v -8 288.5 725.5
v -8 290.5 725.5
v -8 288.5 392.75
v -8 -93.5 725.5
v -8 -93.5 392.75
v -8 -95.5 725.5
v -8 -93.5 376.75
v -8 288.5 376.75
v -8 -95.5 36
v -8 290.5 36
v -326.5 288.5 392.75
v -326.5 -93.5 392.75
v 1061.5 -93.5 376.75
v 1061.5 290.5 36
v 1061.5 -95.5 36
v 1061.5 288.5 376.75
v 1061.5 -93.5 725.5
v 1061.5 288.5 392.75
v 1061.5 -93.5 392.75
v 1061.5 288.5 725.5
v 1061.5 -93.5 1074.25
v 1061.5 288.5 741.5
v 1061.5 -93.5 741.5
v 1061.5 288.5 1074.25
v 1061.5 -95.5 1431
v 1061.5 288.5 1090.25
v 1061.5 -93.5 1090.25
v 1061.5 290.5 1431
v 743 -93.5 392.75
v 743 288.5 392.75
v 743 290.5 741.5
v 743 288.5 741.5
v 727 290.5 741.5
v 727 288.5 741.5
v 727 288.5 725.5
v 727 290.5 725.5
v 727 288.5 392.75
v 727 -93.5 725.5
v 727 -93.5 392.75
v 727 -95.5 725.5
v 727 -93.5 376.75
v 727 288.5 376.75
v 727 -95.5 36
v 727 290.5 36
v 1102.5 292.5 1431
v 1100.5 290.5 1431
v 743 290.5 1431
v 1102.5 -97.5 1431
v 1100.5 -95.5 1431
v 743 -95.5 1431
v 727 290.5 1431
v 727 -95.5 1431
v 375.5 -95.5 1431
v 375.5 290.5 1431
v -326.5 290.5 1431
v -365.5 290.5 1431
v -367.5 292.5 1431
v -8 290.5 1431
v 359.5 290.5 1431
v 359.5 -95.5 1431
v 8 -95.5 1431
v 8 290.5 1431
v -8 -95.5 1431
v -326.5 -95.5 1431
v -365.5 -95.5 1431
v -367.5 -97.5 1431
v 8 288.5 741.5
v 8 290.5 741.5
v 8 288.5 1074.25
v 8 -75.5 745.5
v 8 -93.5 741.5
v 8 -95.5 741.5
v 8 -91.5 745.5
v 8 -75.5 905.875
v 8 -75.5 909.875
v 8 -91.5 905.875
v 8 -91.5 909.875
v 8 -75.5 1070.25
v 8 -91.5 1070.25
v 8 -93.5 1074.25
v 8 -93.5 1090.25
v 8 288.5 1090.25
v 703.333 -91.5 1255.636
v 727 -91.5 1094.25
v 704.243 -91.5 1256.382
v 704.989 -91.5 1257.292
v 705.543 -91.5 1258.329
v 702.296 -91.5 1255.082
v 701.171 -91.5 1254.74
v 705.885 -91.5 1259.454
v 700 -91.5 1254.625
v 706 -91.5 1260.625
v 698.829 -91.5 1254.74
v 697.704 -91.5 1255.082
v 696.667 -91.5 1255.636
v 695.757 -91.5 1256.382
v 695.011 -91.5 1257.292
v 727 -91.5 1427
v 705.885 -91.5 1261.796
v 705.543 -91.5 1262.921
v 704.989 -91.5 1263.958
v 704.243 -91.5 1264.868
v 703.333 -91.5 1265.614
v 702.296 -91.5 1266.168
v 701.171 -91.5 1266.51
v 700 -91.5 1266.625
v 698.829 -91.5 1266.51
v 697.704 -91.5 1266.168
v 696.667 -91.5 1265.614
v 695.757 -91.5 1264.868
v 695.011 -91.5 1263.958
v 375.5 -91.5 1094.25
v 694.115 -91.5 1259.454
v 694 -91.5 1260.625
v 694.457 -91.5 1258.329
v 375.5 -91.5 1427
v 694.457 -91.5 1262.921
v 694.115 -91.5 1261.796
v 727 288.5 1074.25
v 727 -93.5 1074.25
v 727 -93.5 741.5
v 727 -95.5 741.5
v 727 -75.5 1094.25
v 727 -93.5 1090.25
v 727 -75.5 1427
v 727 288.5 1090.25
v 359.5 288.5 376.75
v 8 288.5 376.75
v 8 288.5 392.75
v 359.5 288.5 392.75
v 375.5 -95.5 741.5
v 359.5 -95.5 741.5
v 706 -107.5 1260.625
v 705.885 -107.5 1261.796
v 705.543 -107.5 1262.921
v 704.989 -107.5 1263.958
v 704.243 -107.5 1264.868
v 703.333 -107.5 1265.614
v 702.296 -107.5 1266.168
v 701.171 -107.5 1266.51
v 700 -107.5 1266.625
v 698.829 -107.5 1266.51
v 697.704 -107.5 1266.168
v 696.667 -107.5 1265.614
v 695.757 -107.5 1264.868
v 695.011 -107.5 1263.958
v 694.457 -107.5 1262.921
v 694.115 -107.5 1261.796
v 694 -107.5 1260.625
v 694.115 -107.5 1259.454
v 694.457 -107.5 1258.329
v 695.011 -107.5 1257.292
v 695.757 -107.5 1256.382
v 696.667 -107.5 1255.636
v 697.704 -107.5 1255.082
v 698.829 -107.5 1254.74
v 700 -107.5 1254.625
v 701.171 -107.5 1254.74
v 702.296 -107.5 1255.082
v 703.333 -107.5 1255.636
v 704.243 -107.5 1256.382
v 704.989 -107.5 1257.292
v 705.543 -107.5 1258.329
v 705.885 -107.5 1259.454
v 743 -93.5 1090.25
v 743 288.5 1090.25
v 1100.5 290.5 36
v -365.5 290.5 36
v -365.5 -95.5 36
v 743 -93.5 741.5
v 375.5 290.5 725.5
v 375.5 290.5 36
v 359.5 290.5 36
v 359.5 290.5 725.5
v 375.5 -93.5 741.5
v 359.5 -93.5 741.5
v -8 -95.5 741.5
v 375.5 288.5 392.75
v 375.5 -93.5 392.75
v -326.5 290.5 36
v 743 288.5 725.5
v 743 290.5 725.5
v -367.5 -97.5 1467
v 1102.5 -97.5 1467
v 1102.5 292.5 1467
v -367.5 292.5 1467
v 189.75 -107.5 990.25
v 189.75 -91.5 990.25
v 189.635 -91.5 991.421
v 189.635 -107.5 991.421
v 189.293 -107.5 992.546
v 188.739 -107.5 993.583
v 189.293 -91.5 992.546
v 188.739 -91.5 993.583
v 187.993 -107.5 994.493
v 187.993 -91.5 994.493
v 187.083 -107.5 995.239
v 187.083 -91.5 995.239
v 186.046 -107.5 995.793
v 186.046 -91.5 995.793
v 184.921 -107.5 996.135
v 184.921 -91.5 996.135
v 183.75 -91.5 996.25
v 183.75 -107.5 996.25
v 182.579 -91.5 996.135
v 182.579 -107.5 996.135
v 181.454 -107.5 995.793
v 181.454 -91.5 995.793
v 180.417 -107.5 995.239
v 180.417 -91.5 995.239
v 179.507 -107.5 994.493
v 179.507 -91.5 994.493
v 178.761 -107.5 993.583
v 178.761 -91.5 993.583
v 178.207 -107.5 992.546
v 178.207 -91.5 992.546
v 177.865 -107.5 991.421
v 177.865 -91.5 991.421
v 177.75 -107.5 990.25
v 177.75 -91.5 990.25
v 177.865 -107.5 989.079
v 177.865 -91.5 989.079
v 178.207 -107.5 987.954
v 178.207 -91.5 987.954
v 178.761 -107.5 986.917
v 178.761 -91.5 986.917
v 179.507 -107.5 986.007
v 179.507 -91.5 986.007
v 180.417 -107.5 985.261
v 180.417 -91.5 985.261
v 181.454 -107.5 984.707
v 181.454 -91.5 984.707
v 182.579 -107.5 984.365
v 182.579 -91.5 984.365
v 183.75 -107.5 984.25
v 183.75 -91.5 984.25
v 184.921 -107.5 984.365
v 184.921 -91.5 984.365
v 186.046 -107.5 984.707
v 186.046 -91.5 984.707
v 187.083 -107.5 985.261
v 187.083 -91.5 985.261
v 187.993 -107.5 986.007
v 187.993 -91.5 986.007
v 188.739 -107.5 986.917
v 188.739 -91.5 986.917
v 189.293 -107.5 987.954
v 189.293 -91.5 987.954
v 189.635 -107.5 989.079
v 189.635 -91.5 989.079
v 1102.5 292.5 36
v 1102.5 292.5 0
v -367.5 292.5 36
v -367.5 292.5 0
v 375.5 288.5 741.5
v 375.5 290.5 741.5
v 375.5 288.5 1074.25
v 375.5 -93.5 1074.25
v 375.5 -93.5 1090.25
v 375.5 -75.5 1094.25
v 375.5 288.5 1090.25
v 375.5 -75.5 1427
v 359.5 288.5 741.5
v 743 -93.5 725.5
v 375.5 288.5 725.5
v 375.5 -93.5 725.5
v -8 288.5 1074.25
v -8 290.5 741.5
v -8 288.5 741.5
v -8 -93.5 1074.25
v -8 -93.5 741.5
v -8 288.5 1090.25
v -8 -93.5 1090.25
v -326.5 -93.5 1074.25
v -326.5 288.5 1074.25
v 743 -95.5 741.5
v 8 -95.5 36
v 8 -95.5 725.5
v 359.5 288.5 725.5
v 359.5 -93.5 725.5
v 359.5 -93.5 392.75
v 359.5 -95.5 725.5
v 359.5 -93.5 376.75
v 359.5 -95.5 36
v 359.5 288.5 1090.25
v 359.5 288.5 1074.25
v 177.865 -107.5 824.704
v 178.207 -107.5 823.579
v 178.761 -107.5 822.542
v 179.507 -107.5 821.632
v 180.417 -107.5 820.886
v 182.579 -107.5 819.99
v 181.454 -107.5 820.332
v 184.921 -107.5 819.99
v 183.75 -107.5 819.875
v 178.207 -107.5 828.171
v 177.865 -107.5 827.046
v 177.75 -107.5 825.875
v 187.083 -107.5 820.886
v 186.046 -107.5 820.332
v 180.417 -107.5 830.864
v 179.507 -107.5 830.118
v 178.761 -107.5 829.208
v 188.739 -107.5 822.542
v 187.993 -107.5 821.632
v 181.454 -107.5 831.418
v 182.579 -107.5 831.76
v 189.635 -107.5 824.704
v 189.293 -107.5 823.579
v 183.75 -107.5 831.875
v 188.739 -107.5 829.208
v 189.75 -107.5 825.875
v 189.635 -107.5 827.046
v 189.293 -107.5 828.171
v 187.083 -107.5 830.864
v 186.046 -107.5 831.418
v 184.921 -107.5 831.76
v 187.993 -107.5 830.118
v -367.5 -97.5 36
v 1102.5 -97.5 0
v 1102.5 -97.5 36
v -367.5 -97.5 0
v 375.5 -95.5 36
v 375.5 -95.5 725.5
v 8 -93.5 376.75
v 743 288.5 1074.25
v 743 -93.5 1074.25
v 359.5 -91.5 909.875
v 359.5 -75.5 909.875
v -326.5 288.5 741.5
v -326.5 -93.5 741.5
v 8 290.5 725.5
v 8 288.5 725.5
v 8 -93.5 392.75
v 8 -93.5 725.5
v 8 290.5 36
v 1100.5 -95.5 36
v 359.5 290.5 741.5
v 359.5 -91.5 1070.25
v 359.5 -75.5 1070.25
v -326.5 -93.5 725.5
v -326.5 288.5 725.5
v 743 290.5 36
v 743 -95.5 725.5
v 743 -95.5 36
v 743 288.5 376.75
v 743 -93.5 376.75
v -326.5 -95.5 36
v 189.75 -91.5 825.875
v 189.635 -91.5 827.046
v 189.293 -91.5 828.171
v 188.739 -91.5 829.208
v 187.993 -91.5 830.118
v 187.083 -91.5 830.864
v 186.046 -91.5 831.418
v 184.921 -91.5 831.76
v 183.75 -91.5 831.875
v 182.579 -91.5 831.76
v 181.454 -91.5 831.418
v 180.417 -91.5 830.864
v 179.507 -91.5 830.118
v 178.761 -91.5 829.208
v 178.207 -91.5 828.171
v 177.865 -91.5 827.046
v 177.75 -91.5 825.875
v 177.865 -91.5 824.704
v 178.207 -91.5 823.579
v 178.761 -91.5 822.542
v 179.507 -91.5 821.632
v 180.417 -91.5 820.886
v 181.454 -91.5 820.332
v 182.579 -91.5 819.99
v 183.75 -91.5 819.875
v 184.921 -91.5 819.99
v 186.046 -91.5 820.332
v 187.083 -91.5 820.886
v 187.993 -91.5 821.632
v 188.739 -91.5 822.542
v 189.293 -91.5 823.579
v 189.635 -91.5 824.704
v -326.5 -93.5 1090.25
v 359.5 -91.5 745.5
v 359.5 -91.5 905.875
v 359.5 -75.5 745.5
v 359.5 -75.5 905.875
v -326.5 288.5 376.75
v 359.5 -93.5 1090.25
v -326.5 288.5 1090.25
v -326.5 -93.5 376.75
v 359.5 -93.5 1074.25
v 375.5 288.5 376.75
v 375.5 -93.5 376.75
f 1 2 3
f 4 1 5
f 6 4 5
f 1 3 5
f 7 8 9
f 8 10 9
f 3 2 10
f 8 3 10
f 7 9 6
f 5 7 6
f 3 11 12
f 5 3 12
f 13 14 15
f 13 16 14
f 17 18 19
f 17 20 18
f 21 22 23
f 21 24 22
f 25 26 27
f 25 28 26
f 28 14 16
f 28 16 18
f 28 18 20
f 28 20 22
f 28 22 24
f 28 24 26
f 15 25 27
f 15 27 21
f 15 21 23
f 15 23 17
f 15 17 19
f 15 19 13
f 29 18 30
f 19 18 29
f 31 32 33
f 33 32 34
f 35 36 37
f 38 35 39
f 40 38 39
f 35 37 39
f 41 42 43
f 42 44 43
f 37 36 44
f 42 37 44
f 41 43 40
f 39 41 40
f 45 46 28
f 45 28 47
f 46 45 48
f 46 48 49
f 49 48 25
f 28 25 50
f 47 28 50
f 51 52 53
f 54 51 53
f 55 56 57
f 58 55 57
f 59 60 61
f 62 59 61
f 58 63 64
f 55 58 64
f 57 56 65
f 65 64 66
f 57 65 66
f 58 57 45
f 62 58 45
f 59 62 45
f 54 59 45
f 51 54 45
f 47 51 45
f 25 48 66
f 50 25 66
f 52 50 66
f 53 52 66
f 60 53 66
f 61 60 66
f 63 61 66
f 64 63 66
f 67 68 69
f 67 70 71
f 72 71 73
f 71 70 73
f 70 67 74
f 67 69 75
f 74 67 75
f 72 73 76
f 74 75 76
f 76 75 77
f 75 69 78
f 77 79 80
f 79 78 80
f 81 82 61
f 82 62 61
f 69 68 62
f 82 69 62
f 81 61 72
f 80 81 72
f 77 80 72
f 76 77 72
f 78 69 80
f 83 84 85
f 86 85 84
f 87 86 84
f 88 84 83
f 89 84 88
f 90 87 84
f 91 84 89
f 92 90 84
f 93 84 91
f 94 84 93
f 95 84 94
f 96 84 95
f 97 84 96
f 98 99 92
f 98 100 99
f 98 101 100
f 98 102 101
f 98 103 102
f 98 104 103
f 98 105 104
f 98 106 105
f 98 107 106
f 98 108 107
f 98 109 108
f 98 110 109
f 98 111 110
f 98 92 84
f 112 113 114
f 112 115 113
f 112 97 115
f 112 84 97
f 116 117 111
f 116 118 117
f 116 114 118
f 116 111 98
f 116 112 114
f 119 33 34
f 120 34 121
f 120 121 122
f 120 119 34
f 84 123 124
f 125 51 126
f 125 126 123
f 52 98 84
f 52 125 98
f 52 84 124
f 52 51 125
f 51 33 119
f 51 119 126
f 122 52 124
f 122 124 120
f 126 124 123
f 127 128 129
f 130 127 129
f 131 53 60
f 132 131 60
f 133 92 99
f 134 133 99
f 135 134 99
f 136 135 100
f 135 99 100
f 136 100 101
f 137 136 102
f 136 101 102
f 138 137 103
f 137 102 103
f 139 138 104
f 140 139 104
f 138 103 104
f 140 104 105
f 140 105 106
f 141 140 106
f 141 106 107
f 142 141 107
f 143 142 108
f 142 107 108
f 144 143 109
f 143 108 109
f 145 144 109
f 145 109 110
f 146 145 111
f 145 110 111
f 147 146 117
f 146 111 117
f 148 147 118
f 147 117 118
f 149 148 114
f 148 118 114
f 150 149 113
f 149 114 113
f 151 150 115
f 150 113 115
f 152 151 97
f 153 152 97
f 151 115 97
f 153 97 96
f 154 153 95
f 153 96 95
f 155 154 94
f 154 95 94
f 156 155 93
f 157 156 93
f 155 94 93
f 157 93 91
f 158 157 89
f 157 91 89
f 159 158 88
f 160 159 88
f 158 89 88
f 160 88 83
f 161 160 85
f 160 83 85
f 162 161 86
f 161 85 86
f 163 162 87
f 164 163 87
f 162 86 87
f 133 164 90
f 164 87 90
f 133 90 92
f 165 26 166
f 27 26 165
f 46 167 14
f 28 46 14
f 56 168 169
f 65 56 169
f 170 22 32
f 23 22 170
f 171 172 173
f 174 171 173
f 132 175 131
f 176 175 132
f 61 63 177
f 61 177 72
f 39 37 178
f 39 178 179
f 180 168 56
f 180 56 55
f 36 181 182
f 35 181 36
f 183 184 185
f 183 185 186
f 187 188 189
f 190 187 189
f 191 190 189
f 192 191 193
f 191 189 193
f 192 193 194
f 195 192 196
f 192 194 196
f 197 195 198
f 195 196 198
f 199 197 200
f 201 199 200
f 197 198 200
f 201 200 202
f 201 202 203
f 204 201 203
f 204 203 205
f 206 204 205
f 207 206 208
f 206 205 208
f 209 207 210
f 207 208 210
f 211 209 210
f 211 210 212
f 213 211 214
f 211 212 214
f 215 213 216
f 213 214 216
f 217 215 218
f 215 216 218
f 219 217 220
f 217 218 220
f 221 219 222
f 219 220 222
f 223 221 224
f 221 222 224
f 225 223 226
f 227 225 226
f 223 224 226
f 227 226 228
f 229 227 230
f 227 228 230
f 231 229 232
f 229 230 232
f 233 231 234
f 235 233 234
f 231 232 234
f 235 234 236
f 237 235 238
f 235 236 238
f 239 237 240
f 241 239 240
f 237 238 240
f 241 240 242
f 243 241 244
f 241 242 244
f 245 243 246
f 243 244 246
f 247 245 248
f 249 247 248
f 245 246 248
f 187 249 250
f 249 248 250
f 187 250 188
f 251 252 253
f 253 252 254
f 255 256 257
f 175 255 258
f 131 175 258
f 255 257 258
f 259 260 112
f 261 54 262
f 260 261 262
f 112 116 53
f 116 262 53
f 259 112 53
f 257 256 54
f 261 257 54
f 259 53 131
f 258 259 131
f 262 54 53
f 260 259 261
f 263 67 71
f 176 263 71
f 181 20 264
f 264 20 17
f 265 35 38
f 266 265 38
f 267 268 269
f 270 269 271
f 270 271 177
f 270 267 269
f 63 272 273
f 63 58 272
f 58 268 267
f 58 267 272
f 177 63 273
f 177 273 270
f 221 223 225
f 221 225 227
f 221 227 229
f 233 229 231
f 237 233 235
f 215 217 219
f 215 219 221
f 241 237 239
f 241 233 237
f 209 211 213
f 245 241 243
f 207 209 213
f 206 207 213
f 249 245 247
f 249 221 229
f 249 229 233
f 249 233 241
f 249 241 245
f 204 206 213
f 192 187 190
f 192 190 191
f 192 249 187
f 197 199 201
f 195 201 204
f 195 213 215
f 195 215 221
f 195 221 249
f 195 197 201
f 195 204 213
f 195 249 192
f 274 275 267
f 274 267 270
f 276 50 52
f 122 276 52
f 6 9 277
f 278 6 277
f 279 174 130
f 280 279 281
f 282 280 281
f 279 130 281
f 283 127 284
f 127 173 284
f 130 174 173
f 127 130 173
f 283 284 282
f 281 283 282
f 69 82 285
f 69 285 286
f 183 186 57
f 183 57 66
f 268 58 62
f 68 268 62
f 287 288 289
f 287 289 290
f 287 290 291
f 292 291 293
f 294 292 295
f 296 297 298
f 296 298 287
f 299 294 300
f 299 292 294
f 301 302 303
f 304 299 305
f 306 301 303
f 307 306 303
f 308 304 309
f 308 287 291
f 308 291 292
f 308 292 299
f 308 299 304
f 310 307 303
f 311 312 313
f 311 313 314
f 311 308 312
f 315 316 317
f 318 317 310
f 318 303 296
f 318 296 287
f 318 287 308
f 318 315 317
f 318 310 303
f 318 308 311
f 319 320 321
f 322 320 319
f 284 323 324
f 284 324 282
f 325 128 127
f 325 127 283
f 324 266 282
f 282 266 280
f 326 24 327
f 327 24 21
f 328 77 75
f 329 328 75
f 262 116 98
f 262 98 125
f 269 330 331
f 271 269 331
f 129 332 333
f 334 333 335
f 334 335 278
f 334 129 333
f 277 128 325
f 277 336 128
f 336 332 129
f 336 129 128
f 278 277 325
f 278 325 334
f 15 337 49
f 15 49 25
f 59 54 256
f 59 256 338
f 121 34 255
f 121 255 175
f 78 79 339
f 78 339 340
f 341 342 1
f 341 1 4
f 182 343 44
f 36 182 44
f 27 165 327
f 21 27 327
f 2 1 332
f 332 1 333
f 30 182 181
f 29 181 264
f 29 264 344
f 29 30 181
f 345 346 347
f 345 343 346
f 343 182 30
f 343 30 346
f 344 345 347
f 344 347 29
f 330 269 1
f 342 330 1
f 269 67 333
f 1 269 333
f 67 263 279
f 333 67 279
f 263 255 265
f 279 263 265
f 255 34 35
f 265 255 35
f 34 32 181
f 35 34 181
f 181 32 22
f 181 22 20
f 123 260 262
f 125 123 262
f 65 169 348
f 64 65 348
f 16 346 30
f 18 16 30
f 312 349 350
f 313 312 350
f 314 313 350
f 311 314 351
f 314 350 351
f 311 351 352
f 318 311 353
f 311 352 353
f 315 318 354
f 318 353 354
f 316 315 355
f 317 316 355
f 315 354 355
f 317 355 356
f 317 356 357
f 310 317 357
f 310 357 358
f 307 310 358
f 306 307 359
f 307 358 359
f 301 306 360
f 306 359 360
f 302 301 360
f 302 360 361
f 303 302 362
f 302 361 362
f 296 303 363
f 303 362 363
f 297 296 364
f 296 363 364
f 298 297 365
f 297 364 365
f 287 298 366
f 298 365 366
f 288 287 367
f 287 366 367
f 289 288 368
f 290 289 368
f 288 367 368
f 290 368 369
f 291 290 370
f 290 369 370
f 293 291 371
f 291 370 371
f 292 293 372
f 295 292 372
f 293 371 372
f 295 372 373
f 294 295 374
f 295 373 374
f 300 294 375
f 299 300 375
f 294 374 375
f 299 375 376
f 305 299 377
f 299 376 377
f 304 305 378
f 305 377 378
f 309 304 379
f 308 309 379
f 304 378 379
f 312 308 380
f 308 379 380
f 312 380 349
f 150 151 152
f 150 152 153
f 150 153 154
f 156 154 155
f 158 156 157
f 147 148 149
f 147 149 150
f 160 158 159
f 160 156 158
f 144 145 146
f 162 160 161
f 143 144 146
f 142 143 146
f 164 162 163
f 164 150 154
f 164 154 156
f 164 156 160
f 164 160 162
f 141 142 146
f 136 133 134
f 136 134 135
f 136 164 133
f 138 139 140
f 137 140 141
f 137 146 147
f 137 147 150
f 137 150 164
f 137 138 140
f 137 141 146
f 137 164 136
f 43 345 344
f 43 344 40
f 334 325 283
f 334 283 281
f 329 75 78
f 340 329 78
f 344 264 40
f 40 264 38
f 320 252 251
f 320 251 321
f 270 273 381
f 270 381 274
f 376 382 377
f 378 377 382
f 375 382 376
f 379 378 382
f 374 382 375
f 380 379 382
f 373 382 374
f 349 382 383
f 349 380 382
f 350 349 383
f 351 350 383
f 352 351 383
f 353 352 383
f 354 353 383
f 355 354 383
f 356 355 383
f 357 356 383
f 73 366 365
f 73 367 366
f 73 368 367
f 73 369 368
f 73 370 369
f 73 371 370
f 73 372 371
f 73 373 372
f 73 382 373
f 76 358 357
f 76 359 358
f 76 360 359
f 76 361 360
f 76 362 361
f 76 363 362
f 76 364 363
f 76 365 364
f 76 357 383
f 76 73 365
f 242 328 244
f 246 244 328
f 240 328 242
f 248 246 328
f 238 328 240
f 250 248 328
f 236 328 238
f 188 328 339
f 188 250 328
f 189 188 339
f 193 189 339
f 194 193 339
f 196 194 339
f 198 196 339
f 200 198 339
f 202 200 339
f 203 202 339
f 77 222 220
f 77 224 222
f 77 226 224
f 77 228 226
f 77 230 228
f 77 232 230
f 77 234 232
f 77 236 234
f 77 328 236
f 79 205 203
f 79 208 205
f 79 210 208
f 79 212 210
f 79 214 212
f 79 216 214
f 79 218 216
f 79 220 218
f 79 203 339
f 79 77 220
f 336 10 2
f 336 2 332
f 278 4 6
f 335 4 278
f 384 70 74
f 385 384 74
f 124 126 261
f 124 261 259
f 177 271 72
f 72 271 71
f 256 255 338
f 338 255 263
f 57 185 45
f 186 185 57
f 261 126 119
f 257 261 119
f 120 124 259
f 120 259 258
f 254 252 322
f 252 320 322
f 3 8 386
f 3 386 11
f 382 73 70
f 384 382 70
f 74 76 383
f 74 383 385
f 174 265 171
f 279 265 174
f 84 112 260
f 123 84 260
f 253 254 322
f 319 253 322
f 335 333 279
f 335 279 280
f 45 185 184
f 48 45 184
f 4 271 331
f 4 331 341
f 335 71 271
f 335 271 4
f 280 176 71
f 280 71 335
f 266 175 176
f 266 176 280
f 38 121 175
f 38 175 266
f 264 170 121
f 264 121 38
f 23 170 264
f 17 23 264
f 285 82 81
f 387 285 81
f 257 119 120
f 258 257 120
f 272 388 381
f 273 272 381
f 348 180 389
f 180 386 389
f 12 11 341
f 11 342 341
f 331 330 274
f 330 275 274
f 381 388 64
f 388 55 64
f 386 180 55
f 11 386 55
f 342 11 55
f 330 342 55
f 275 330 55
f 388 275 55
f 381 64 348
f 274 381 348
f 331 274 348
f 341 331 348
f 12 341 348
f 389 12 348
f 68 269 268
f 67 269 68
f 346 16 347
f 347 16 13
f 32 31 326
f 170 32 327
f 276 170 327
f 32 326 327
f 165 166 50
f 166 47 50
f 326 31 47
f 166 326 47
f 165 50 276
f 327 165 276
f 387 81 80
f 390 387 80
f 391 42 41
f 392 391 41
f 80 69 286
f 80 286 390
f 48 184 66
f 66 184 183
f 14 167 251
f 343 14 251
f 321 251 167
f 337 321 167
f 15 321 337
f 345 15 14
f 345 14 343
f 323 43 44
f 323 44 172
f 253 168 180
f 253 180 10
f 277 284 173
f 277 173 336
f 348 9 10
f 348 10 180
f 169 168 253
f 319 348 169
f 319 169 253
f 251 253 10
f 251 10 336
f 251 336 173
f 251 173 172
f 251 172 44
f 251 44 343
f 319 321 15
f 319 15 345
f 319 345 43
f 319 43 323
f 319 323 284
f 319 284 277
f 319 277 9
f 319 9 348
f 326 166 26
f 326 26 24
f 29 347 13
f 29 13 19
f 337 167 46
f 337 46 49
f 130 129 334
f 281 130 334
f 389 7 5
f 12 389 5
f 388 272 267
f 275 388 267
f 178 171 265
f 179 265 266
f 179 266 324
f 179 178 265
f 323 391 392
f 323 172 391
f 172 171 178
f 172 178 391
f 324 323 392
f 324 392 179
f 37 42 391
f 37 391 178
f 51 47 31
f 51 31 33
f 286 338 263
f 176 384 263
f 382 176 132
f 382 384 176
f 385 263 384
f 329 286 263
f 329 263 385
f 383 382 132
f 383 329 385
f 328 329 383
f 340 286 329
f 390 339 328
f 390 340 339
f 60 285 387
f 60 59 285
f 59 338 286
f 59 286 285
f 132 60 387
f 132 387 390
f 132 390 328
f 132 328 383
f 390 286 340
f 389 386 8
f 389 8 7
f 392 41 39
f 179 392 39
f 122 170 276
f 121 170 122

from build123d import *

# Parameters (mm, degrees)
F0_W      = 697
F0_H      = 195
F0_W_2    = 36
F0_W_3    = 2
F1_DEPTH  = 36
F2_W      = 39
F2_H      = 193
F3_DEPTH  = 697.5
F4_W      = 191
F4_H      = 8
F4_H_2    = 16
F5_DEPTH  = 694
F6_W      = 16
F6_H      = 193
F6_W_2    = 8
F7_DEPTH  = 689.5
F11_W     = 16
F11_H     = 332.75
F12_DEPTH = 351.5
F13_R     = 6
F14_DEPTH = 16
F15_W     = 16
F15_H     = 160.375
F16_DEPTH = 351.5
F17_R     = 6
F18_DEPTH = 16


with BuildPart() as f1:
    # F0 (on Top) → F1 (new body)
    with BuildSketch(Plane.XY):
        with Locations((19, 0)):
            Rectangle(F0_W, F0_H)
        with Locations((-347.5, 0)):
            Rectangle(F0_W_2, F0_H)
        with Locations((-366.5, 0)):
            Rectangle(F0_W_3, F0_H)
    extrude(amount=F1_DEPTH)

    # F2 (on face) → F3 (join)
    with BuildSketch(Plane.XY.offset(36)):
        with Locations((-346, 1)):
            Rectangle(F2_W, F2_H)
    extrude(amount=F3_DEPTH)

    # F4 (on face) → F5 (join, through all)
    with BuildSketch(Plane.YZ.offset(-326.5)):
        with Locations((2, 729.5)):
            Rectangle(F4_W, F4_H)
        with Locations((2, 384.75)):
            Rectangle(F4_W, F4_H_2)
    extrude(amount=F5_DEPTH)

    # F6 (on face) → F7 (join, through all)
    with BuildSketch(Plane.XY.offset(36)):
        with Locations((0, 1)):
            Rectangle(F6_W, F6_H)
        with Locations((363.5, 1)):
            Rectangle(F6_W_2, F6_H)
    extrude(amount=F7_DEPTH)

    # F8: F1 across face


with BuildPart() as f1_1:
    add(f1.part)
    add(f1.part.mirror(Plane(origin=(0.8067832183, 1.9462668028, 733.5), x_dir=(1, 0, 0), z_dir=(0, 0, 1))))

    # F9: F1 across face


with BuildPart() as f1_2:
    add(f1_1.part)
    add(f1_1.part.mirror(Plane(origin=(367.5, 0.9612205774, 733.5), x_dir=(0, 1, 0), z_dir=(1, 0, 0))))

    # F10: F1 across face


with BuildPart() as f1_3:
    add(f1_2.part)
    add(f1_2.part.mirror(Plane(origin=(367.5, 97.5, 733.5), x_dir=(-1, 0, 0), z_dir=(0, 1, 0))))

    # F11 (on face) → F12 (join, through all)
    with BuildSketch(Plane.YZ.offset(375.5)):
        with Locations((-83.5, 1260.625)):
            Rectangle(F11_W, F11_H)
    extrude(amount=F12_DEPTH)

    # F13 (on face) → F14 (join)
    with BuildSketch(Plane.XZ.offset(91.5)):
        with Locations((700, 1260.625)):
            Circle(F13_R)
    extrude(amount=F14_DEPTH)

    # F15 (on face) → F16 (join, through all)
    with BuildSketch(Plane.YZ.offset(8)):
        with Locations((-83.5, 990.0625)):
            Rectangle(F15_W, F15_H)
        with Locations((-83.5, 825.6875)):
            Rectangle(F15_W, F15_H)
    extrude(amount=F16_DEPTH)

    # F17 (on face) → F18 (join)
    with BuildSketch(Plane.XZ.offset(91.5)):
        with Locations((183.75, 990.25)):
            Circle(F17_R)
        with Locations((183.75, 825.875)):
            Circle(F17_R)
    extrude(amount=F18_DEPTH)


solid = f1_3.part
